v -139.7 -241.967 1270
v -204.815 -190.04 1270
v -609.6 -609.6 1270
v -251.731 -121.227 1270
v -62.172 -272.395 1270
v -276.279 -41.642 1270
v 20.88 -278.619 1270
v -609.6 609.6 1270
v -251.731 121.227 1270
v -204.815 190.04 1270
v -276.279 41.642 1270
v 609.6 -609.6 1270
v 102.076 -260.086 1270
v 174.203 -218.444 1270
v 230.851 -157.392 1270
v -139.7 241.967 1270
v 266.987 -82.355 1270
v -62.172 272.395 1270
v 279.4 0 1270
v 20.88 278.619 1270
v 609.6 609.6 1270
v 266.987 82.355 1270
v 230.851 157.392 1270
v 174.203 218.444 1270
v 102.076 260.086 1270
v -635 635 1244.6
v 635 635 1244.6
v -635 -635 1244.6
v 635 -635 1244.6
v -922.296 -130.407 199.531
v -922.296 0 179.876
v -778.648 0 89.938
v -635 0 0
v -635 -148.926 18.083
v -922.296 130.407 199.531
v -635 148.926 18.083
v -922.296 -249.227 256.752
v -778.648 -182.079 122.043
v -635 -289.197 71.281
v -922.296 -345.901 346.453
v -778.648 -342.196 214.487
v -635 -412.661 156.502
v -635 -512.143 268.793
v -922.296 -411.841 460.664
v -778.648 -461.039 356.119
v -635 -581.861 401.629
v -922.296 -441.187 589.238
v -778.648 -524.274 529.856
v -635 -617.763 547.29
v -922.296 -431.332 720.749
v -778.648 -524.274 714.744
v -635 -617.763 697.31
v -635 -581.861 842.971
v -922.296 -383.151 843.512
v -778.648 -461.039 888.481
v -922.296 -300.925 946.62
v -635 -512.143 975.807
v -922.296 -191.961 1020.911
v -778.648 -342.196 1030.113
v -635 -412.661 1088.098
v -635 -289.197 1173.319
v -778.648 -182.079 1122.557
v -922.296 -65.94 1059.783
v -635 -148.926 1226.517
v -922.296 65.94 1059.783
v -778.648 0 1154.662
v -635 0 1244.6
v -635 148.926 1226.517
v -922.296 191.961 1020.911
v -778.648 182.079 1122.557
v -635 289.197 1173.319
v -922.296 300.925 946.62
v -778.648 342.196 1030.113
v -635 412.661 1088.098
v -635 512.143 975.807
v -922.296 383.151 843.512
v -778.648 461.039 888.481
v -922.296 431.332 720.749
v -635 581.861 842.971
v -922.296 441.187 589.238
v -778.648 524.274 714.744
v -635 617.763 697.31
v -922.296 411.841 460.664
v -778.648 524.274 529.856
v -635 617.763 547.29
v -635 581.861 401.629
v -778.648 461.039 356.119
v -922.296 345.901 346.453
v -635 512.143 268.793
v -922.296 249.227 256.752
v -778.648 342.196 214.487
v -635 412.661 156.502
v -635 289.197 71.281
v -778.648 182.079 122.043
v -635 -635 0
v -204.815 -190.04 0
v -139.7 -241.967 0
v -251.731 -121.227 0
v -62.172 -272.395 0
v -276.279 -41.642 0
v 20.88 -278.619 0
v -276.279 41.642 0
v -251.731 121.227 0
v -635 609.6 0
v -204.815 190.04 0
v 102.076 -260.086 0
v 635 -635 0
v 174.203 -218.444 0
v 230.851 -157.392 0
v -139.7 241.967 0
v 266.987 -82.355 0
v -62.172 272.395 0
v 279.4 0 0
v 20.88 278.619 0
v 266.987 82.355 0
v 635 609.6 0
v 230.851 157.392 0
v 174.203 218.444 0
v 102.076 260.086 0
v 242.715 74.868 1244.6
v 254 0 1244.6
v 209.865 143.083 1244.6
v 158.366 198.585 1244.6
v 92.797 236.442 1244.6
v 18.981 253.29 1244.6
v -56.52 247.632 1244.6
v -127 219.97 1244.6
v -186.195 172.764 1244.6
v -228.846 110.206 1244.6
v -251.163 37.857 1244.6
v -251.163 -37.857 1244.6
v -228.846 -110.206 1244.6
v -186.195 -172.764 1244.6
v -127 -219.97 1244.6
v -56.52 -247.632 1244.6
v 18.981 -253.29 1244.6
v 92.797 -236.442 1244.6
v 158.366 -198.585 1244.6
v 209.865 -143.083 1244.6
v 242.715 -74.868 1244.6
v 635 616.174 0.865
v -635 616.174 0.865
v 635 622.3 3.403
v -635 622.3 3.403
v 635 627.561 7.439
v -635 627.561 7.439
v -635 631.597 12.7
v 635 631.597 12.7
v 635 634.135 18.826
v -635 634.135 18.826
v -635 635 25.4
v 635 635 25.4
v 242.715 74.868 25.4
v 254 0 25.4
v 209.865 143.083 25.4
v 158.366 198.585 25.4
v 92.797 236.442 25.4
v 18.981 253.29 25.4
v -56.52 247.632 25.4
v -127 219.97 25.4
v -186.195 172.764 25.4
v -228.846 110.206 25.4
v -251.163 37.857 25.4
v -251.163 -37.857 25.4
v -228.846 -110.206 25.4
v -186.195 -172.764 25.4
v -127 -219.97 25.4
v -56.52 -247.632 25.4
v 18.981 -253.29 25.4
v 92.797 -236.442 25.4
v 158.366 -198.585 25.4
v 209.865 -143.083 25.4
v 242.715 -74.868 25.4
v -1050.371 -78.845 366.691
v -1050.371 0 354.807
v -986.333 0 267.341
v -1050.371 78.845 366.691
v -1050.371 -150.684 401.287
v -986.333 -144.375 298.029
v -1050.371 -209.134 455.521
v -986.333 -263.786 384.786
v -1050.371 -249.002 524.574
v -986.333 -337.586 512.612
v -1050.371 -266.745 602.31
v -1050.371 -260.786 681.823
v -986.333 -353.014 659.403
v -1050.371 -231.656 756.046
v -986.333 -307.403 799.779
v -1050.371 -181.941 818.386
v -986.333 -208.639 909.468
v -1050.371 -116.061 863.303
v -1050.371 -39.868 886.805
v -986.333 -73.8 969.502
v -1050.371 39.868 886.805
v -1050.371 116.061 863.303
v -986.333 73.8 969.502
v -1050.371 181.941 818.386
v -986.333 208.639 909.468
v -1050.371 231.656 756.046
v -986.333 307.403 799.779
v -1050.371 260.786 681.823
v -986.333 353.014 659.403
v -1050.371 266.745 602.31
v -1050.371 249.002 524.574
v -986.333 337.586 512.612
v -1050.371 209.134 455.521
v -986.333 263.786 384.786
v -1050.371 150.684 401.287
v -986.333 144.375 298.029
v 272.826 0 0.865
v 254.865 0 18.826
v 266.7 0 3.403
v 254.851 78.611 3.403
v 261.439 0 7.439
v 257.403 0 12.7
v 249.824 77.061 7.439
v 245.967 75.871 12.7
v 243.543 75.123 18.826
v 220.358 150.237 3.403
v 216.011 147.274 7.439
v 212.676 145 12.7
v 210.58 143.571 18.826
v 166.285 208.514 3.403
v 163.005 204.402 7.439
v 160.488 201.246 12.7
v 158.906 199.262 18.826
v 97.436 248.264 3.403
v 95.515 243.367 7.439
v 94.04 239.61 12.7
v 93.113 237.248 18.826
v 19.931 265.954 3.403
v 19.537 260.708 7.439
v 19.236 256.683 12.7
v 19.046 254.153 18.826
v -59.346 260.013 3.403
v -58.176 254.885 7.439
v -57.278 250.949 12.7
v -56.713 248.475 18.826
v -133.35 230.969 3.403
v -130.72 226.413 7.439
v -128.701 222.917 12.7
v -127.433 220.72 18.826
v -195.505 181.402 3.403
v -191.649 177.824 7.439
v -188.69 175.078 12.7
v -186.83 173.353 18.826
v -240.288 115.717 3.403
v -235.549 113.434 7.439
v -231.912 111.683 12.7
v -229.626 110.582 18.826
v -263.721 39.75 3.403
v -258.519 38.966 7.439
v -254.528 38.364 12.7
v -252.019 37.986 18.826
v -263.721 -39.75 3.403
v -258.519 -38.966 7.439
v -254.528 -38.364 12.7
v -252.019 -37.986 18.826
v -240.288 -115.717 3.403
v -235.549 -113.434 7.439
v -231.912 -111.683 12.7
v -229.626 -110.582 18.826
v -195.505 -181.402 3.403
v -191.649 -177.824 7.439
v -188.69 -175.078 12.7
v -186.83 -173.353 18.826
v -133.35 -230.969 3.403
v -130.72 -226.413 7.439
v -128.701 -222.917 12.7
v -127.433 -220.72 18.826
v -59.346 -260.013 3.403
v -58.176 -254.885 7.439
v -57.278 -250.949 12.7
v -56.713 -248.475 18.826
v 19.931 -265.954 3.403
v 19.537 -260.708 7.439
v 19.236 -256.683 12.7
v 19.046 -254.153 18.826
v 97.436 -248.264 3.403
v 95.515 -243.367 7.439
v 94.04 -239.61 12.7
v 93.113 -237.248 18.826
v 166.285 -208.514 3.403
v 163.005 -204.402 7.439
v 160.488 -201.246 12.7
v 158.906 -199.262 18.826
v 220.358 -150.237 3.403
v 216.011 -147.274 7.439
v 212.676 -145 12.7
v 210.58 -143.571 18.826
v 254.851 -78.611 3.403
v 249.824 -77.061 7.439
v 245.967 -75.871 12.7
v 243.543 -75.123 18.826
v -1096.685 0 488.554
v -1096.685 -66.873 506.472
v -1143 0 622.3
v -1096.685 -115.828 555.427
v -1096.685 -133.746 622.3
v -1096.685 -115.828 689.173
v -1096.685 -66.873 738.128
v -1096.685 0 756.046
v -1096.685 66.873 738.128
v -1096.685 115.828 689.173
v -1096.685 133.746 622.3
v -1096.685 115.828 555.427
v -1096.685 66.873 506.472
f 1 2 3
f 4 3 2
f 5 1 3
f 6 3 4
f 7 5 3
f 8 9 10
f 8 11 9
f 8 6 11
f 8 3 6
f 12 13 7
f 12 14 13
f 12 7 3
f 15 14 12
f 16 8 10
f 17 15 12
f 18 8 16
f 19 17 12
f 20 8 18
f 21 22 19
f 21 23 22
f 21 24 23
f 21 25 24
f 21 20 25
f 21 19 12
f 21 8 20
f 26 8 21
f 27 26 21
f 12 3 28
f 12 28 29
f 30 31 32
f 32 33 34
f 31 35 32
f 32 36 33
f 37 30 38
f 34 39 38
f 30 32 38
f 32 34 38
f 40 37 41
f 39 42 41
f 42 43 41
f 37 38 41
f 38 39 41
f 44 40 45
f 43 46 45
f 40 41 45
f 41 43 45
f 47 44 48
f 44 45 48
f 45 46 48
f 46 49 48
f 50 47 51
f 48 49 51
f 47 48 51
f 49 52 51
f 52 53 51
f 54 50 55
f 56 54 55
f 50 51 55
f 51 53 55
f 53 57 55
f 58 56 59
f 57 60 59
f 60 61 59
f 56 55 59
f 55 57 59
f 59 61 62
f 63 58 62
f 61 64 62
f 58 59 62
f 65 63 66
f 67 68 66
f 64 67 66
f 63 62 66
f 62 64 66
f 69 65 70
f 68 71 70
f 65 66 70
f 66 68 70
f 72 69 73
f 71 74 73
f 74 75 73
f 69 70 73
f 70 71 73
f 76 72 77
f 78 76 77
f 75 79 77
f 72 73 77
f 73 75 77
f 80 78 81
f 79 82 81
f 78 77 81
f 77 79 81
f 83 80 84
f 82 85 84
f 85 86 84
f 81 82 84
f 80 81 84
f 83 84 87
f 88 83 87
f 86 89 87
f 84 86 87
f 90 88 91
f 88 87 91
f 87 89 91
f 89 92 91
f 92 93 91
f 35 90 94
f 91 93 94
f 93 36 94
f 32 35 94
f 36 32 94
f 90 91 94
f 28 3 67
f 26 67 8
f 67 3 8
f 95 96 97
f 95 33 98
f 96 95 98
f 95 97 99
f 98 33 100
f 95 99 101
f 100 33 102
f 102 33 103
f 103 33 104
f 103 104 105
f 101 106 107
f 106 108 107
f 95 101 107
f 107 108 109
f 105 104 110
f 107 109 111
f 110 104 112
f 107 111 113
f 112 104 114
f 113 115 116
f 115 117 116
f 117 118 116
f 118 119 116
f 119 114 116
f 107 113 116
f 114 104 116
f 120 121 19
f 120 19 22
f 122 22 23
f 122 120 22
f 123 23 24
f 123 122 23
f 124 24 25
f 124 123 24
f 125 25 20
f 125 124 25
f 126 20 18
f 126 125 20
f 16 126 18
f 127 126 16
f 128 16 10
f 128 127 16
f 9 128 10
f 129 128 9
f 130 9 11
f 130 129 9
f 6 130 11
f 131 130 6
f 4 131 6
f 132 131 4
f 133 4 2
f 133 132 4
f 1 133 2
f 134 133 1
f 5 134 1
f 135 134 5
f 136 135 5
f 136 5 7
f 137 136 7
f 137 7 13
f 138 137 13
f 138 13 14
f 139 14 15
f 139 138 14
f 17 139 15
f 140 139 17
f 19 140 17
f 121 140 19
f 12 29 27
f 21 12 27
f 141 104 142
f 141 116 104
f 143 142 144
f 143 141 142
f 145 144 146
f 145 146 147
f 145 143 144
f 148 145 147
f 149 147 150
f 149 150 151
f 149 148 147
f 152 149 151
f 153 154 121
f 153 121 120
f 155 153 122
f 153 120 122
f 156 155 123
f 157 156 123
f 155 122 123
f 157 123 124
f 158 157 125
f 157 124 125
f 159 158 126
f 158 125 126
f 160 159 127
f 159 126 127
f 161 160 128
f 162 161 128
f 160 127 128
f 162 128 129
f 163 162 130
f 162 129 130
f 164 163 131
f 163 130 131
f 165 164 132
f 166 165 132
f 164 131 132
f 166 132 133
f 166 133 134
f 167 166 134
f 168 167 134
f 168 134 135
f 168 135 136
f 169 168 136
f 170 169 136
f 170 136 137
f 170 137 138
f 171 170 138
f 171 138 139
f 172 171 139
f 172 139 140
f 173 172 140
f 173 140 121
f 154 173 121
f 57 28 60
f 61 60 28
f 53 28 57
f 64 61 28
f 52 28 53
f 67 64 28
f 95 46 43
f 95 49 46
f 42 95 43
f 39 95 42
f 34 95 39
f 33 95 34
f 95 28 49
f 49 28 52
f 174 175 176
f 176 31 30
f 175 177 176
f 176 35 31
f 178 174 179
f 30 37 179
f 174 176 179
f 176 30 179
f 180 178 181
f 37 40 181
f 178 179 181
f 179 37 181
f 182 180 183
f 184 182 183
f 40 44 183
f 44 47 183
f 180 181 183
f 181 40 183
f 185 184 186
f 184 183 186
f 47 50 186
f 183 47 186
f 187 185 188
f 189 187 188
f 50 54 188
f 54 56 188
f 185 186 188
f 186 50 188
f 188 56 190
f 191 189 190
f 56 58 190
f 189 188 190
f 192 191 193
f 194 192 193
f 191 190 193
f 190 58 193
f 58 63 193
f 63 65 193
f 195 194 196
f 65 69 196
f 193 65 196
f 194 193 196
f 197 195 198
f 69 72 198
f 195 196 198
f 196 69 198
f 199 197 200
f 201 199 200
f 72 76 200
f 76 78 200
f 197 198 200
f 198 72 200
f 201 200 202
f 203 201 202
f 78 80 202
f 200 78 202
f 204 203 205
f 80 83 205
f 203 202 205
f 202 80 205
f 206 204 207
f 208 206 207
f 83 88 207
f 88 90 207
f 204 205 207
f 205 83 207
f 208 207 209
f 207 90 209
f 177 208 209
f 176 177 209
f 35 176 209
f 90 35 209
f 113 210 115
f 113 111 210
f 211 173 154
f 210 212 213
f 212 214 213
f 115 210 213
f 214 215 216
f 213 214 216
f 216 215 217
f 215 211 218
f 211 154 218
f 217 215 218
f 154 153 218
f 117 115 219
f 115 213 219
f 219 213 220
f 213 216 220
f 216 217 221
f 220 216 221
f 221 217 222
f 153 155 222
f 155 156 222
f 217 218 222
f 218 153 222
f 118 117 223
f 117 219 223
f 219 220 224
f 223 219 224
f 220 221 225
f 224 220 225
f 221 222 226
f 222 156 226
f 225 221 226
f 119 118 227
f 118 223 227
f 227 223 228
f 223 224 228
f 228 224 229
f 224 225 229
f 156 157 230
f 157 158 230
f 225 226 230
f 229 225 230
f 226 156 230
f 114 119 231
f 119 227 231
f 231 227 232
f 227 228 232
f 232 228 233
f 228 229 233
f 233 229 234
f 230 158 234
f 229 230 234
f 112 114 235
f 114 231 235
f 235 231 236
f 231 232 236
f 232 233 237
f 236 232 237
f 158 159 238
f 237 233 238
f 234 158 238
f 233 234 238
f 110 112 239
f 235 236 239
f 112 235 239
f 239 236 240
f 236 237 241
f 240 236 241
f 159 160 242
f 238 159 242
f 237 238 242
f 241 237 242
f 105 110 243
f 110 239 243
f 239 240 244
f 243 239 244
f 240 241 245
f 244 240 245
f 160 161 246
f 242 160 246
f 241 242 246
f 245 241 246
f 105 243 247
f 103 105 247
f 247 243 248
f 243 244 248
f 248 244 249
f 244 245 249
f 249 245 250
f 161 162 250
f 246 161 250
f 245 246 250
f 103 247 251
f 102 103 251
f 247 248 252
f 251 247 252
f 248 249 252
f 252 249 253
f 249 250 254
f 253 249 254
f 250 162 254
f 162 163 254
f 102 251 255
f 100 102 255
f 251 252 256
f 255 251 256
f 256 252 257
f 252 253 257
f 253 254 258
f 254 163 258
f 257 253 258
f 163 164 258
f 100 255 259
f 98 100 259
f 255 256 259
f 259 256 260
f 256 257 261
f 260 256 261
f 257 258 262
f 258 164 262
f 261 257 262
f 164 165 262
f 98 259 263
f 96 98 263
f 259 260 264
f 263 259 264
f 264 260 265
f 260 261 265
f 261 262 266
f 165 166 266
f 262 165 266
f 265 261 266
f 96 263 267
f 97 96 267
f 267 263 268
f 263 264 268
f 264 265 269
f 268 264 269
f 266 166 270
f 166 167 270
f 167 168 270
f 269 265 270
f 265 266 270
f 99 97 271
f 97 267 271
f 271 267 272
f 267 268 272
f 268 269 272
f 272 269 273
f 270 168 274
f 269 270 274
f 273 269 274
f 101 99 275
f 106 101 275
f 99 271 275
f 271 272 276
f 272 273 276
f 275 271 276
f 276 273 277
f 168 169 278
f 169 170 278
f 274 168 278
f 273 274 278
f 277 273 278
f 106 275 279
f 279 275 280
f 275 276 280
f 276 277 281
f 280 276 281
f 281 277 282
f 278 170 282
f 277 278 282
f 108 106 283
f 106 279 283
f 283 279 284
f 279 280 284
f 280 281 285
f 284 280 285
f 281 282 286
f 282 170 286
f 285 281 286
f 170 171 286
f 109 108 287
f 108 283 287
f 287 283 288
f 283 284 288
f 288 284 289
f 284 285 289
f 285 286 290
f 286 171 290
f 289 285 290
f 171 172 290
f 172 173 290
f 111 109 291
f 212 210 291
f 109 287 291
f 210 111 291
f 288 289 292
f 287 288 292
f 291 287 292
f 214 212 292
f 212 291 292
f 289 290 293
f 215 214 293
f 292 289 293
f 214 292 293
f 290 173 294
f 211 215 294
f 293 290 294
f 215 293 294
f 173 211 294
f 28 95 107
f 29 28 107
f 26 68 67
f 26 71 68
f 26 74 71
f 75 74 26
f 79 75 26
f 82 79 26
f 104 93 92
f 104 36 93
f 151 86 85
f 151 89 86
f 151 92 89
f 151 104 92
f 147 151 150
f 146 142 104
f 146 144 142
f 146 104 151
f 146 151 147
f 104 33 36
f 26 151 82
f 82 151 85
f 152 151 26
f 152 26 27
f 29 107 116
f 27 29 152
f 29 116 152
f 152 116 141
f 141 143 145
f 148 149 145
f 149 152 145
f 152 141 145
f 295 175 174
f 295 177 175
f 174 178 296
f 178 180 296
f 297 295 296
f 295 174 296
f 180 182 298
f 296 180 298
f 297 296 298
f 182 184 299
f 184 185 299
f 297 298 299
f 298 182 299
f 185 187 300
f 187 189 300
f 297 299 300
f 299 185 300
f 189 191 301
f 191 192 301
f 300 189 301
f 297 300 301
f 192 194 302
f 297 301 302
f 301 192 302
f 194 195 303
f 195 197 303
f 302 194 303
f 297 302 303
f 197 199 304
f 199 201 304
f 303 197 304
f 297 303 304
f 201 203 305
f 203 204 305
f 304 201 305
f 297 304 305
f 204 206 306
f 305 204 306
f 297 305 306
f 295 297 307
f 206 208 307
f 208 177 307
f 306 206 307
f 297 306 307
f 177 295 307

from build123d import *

# Parameters (mm, degrees)
F0_W     = 1270
F0_H     = 1270
F1_DEPTH = 1270
F2_R     = 254
F3_DEPTH = 1270.001
F4_SIZE  = 25.4
F5_R     = 25.4
F6_R     = 25.4


with BuildPart() as f1:
    # F0 (on Top) → F1 (new body)
    with BuildSketch(Plane.XY):
        Rectangle(F0_W, F0_H)
    extrude(amount=F1_DEPTH)

    # F2 (on face) → F3 (cut, through all)
    with BuildSketch(Plane.XY.offset(1270)):
        Circle(F2_R)
    extrude(amount=-F3_DEPTH, mode=Mode.SUBTRACT)

    # F4
    f4_edges = [f1.edges().sort_by_distance(p)[0] for p in [
        (0, -635, 1270),
        (-635, 0, 1270),
        (635, 0, 1270),
        (0, 635, 1270),
        (-254, 0, 1270),
    ]]
    chamfer(f4_edges, length=F4_SIZE)

    # F5
    f5_edges = [f1.edges().sort_by_distance(p)[0] for p in [
        (-254, 0, 0),
    ]]
    fillet(f5_edges, radius=F5_R)

    # F6
    f6_edges = [f1.edges().sort_by_distance(p)[0] for p in [
        (0, 635, 0),
    ]]
    fillet(f6_edges, radius=F6_R)

    # F7 (on Front) → F8 (revolve)
    with BuildSketch(Plane.XZ):
        Polygon((-635, 0), (-635, 622.3), (-1143, 622.3), (-1050.3706932068, 354.807138443), (-922.2957491875, 179.8755228519), align=None)
    revolve(axis=Axis((-889, 0, 622.3), (-1, 0, 0)))


solid = f1.part
